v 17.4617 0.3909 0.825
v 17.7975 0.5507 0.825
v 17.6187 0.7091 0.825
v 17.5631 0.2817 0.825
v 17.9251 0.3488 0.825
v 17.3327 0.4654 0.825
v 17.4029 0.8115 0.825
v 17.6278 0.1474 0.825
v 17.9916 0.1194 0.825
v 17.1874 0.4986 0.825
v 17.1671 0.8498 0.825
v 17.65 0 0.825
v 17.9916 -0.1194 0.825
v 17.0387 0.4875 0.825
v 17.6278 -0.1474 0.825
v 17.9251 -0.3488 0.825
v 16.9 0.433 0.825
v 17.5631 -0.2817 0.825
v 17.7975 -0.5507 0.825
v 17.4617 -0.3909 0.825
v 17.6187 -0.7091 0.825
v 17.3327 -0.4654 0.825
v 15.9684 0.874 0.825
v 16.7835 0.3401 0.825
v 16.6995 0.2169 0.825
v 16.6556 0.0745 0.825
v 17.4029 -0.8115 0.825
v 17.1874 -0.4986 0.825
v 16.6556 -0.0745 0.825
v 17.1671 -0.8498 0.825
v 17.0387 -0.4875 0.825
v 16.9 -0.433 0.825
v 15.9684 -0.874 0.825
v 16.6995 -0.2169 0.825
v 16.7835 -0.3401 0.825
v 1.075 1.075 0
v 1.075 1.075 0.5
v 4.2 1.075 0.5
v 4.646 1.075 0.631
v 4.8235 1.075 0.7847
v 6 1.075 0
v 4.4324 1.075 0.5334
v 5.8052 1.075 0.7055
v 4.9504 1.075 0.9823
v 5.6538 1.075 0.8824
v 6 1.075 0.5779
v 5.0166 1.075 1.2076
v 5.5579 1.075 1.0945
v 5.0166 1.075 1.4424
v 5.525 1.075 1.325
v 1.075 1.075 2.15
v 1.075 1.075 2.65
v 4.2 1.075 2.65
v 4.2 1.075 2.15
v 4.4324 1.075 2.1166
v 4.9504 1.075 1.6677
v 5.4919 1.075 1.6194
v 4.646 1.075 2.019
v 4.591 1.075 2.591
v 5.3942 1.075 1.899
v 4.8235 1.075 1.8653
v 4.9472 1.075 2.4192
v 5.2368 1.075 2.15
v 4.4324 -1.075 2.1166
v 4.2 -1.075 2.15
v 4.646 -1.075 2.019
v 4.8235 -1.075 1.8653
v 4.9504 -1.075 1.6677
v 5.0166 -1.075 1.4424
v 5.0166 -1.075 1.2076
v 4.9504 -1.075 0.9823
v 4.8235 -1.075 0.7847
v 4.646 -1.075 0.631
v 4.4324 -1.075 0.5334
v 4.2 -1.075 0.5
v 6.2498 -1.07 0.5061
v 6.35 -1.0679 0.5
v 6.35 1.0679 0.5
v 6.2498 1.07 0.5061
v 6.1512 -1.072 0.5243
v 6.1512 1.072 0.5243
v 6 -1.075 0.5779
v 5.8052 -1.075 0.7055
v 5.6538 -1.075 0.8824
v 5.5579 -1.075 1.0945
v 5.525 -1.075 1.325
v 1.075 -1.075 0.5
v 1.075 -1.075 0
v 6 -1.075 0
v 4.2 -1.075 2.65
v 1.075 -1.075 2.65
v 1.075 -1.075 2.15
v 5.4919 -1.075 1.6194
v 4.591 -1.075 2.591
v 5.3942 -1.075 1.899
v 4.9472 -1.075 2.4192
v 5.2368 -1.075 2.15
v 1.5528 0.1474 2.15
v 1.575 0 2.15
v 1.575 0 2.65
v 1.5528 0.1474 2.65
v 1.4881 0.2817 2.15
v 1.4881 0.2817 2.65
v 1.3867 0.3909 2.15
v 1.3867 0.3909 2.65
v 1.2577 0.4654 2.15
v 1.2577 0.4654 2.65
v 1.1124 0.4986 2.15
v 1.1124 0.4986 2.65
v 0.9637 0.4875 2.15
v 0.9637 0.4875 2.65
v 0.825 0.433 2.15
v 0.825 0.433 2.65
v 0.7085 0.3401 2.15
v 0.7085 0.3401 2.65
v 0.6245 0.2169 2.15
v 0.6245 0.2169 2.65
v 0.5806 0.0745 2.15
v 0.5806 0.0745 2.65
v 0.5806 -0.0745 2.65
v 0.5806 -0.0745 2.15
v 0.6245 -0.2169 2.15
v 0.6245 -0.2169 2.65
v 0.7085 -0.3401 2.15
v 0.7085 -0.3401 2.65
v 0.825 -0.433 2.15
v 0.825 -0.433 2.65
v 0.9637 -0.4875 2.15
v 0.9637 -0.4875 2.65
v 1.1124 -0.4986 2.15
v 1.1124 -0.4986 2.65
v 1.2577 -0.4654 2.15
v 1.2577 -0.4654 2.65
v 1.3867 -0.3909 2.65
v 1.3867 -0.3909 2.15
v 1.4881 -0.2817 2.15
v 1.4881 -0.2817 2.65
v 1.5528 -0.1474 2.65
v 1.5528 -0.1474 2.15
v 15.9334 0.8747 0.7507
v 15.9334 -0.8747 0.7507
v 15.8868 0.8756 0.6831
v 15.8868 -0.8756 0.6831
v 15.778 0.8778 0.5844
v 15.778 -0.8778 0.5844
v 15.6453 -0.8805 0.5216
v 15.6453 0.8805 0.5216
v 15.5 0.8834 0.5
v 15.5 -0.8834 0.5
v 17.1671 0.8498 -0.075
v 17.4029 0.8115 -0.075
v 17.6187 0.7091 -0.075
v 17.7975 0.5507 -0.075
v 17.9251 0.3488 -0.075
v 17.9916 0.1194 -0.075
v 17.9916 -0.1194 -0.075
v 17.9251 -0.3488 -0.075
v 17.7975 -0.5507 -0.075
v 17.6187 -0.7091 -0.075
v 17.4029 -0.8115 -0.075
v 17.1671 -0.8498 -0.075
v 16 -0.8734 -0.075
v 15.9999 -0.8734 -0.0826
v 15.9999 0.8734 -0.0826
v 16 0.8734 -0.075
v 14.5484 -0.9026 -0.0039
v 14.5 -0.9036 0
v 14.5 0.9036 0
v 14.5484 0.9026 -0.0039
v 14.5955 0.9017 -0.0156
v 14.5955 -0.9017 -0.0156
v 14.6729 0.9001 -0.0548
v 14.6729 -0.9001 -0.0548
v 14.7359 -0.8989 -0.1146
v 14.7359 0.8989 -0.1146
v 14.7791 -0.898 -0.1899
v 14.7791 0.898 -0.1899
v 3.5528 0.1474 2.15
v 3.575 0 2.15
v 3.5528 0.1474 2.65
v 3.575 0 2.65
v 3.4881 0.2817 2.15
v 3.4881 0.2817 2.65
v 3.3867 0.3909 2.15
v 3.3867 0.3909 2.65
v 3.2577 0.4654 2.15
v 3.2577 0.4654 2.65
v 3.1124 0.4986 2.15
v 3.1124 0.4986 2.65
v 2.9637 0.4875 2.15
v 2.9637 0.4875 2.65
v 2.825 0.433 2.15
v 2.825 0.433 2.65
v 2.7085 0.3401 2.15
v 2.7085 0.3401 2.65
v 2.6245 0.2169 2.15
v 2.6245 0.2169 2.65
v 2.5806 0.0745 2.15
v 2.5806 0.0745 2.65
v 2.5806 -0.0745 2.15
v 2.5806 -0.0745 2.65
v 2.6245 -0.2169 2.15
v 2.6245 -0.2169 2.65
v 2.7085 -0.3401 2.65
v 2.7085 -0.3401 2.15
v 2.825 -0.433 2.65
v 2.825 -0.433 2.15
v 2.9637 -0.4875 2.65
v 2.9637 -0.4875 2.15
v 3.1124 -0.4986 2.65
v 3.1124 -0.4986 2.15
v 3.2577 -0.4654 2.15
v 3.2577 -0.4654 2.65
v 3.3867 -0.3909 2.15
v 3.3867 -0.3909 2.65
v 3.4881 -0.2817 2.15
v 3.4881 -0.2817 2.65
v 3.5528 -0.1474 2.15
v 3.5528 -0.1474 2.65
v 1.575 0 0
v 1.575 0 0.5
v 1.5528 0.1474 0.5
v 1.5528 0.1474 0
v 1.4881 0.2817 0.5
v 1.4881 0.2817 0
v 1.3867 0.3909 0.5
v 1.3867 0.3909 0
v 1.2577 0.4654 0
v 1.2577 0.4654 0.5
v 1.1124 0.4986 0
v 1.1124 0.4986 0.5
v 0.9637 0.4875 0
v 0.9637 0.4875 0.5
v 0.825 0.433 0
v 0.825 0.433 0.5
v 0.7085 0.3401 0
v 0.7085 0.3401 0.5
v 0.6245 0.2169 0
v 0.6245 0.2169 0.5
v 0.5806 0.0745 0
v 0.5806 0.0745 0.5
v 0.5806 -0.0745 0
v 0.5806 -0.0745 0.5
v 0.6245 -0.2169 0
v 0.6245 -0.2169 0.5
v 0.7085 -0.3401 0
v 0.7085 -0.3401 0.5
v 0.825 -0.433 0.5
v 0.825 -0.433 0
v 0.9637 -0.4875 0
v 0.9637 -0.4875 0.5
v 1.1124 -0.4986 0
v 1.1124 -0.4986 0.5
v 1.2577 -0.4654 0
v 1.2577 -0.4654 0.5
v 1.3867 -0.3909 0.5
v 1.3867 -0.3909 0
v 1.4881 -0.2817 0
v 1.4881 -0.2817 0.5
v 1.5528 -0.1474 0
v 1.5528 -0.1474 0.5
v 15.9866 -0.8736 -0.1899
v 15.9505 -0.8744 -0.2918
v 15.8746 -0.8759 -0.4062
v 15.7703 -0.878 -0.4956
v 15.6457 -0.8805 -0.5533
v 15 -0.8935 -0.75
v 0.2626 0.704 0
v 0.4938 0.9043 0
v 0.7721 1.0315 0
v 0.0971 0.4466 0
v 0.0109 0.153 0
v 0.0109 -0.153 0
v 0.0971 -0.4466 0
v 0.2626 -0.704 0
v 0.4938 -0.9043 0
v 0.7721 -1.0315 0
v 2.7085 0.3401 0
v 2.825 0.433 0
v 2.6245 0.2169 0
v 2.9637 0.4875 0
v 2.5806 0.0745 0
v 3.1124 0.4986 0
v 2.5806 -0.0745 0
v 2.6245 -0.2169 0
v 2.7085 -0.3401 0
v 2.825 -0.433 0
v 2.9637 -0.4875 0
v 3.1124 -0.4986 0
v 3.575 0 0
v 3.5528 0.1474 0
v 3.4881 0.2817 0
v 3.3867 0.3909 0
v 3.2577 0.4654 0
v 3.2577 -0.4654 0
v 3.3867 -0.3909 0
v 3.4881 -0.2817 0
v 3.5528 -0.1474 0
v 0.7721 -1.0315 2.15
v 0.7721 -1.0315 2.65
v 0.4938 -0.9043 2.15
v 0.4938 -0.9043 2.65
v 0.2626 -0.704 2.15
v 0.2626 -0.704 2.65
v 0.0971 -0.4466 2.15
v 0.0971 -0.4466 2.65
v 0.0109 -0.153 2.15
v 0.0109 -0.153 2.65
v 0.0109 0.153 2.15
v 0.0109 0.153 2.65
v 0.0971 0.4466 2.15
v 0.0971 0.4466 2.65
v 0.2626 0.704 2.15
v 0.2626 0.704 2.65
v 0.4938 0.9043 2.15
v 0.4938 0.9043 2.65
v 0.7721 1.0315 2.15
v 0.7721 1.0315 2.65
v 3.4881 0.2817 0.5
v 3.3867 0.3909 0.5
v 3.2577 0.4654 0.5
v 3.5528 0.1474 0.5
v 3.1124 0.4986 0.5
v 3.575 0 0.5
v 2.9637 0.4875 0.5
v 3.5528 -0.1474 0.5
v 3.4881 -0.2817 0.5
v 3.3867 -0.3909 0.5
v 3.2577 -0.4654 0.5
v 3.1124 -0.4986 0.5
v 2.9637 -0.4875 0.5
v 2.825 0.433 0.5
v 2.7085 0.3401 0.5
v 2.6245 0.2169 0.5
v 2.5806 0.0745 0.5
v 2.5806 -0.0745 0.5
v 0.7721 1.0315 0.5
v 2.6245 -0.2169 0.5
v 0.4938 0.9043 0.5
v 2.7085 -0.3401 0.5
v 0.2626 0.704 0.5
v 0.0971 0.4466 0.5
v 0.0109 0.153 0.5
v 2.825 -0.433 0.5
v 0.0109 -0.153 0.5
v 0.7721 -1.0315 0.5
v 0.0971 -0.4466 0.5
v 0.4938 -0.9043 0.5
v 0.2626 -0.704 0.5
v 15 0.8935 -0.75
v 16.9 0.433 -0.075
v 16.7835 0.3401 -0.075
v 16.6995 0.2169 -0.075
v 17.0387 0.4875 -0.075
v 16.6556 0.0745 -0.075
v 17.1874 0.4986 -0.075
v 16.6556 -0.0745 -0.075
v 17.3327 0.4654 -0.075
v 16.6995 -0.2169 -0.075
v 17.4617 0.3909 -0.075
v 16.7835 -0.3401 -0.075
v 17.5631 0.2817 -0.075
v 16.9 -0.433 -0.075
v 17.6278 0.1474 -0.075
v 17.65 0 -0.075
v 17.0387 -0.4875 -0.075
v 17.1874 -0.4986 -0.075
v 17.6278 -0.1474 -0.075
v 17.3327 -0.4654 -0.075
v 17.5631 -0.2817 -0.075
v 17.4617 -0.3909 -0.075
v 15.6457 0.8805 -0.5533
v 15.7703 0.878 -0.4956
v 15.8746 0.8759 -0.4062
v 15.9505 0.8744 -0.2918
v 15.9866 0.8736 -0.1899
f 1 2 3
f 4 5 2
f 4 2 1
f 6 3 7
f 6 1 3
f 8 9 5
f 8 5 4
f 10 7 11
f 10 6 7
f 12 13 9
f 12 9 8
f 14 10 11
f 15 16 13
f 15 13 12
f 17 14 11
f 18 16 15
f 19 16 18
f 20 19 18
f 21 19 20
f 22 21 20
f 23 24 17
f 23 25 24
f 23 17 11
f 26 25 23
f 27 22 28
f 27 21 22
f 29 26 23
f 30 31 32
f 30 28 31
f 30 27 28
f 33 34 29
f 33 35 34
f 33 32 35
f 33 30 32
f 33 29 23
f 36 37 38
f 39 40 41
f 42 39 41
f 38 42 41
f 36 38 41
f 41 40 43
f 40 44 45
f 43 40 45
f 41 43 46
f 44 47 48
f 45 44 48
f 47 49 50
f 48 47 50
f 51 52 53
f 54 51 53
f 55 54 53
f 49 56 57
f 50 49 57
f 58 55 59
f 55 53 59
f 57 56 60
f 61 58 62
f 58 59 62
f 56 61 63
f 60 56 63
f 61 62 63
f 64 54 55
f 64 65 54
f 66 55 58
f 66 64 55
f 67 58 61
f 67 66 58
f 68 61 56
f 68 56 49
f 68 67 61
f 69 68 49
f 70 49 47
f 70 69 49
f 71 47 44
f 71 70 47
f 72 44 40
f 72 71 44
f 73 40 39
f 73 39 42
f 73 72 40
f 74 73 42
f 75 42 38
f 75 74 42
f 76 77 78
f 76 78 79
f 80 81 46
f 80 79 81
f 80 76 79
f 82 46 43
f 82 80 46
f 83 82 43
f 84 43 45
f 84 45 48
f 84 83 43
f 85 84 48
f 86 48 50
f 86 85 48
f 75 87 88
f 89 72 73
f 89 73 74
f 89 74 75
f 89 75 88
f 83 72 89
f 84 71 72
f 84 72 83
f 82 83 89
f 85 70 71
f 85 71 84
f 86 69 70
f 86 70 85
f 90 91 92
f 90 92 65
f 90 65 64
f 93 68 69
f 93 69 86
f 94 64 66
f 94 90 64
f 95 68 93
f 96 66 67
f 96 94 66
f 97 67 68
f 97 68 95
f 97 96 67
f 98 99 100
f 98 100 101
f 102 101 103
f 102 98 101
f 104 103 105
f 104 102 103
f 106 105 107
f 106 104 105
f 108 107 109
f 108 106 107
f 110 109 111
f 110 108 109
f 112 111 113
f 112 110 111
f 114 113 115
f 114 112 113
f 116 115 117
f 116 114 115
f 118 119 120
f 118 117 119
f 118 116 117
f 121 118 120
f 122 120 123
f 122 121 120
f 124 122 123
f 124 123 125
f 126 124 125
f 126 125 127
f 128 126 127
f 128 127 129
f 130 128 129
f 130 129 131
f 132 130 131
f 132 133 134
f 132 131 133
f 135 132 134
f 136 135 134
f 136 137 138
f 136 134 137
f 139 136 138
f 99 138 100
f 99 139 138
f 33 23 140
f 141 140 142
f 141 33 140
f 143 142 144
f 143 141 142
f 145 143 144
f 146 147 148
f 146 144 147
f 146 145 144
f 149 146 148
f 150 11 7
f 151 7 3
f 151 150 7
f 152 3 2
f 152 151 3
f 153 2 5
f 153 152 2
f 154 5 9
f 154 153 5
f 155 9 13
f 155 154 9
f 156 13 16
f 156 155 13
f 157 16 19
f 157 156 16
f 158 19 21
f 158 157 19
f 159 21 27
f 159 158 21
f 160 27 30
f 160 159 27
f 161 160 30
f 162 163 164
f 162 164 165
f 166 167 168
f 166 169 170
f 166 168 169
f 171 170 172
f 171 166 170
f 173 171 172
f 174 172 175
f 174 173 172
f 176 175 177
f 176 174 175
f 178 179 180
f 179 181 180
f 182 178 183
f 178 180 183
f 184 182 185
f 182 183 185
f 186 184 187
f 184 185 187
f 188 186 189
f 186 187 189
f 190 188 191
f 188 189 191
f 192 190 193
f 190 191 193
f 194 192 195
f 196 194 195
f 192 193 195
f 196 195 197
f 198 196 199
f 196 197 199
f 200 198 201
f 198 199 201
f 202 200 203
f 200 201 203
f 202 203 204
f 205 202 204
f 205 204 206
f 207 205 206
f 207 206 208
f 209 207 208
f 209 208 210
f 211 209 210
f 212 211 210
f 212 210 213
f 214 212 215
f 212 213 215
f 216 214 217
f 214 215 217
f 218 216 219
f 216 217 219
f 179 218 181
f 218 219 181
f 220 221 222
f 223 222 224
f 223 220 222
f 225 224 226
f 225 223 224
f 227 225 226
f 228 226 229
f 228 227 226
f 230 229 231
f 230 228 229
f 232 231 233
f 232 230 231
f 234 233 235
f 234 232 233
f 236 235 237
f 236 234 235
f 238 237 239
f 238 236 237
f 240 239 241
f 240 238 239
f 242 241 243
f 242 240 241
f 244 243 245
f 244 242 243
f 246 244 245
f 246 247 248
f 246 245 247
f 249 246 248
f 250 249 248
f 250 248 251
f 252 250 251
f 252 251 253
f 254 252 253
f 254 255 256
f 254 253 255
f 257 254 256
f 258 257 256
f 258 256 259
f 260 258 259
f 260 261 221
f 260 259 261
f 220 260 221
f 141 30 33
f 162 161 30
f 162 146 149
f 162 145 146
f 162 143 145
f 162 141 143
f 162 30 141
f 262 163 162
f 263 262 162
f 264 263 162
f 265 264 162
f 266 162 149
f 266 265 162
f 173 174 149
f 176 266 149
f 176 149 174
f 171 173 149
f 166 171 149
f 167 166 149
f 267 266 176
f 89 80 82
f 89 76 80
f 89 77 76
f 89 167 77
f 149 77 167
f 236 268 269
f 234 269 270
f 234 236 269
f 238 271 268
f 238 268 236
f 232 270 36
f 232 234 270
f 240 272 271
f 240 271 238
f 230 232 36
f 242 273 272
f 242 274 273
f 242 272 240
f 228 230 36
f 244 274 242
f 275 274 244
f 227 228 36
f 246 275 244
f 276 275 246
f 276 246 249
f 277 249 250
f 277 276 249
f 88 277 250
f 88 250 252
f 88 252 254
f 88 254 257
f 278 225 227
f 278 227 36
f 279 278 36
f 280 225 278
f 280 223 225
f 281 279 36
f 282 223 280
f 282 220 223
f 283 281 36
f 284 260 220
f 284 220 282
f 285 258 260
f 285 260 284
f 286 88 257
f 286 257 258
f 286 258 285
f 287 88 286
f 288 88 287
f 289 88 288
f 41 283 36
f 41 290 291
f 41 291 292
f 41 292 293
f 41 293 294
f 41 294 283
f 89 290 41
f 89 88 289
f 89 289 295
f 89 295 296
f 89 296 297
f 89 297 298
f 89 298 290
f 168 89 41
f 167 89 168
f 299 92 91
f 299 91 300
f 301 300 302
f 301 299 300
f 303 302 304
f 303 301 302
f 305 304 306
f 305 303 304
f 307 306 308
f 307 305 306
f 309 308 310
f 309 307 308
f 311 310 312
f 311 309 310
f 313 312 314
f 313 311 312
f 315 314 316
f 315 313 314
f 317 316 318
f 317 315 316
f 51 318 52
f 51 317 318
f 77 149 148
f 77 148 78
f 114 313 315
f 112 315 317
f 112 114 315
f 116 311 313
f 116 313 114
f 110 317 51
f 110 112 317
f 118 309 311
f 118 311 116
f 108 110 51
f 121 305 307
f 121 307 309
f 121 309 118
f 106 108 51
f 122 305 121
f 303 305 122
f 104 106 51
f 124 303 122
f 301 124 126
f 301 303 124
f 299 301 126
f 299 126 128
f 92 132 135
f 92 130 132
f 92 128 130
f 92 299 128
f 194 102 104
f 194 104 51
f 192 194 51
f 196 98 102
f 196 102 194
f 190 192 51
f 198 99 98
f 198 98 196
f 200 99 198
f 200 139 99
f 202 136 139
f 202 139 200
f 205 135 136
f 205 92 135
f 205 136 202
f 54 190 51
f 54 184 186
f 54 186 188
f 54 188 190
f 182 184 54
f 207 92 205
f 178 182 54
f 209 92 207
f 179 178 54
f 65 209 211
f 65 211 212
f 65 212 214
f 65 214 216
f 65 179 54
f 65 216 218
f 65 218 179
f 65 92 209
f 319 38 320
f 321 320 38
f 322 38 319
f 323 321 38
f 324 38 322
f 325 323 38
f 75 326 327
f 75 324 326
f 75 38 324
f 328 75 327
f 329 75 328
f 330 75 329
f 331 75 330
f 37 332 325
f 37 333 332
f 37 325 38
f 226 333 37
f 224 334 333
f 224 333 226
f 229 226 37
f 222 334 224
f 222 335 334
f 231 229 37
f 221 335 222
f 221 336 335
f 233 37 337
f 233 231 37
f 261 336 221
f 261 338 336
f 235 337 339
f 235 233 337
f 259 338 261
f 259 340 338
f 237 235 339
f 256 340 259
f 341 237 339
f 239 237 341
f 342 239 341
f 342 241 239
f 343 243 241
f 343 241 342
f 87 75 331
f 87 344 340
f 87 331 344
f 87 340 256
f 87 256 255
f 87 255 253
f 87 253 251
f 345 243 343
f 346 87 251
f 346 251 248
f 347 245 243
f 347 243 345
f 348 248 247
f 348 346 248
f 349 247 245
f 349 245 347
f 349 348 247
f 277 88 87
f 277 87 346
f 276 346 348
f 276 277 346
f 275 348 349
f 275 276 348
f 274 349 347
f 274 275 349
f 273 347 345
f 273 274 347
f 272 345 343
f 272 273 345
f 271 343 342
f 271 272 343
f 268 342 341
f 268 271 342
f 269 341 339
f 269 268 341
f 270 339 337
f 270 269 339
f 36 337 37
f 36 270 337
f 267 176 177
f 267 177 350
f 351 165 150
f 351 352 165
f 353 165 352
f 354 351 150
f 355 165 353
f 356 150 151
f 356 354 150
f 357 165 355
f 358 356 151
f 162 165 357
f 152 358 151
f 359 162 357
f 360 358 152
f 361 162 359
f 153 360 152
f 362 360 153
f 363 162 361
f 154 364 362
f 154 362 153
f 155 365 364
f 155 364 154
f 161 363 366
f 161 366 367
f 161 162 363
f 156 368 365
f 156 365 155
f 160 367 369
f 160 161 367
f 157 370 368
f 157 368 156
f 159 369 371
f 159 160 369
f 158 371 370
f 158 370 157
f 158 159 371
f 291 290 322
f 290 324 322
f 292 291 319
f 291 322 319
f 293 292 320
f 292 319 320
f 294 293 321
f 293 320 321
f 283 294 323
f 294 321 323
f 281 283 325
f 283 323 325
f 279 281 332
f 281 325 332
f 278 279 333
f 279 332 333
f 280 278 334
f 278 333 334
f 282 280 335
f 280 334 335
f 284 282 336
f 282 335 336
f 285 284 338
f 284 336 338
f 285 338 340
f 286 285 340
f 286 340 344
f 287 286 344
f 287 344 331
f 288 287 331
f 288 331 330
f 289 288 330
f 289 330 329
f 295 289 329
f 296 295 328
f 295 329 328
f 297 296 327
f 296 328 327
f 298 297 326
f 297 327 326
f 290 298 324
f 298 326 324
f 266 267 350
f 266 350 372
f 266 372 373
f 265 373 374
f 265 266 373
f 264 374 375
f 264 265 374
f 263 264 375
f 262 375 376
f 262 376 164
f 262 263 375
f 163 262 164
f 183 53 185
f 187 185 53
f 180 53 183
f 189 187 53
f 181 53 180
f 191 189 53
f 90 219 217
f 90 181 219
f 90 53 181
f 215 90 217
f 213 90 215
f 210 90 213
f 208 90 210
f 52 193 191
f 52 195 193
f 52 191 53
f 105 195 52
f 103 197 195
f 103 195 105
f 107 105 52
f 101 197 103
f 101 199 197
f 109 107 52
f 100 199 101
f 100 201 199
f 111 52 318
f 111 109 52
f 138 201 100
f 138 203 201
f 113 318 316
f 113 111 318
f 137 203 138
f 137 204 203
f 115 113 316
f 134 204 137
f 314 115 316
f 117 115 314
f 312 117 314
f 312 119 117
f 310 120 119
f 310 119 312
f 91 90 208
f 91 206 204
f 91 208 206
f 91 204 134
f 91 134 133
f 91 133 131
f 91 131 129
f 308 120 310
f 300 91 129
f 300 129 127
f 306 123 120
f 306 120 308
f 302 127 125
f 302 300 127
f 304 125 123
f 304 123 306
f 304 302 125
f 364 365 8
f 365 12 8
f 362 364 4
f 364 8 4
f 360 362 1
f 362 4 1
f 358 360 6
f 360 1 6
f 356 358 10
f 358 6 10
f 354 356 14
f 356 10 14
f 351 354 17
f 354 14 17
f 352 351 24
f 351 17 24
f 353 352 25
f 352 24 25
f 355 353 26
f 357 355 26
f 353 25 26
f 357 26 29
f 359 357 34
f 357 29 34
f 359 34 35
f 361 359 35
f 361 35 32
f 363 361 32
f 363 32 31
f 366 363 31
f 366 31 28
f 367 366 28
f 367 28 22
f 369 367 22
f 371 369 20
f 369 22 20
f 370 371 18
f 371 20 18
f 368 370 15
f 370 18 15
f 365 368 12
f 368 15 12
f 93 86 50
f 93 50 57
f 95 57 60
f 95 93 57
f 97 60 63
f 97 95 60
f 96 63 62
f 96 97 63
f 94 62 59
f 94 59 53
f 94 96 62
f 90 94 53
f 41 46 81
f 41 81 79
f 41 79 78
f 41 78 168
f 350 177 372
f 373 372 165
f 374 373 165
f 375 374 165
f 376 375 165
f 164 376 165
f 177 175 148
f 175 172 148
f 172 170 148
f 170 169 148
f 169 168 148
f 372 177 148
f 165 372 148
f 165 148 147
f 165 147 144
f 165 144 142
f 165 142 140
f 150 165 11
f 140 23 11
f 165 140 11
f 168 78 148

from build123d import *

# Parameters (mm, degrees)
F1_DEPTH = 1.075
F2_W     = 20.9250352345
F2_H     = 5.8195129968
F2_R     = 0.5
F3_DEPTH = 12.5
F4_R     = 0.5
F5_DEPTH = 12.5


# Not quite as in the source:
# - ends of sketch curves that miss each other by under 0.0002 mm in the source are joined


with BuildPart() as f1:
    # F0 (on Front) → F1 (new body, symmetric)
    with BuildSketch(Plane.XZ):
        with BuildLine():
            Line((0, 0.5), (0, 0))
            Line((0, 0), (14.5, 0))
            ThreePointArc((14.5, 0), (14.6687831398, -0.051983364), (14.7790735103, -0.1899183219))
            Line((14.7790735103, -0.1899183219), (15, -0.75))
            Line((15, -0.75), (15.645704163, -0.55329938))
            ThreePointArc((15.645704163, -0.55329938), (15.8994973246, -0.3756690667), (15.9999418448, -0.082625733))
            Line((15.9999418448, -0.082625733), (16, -0.075))
            Line((16, -0.075), (18, -0.075))
            Line((18, -0.075), (18, 0.825))
            Line((18, 0.825), (15.9683748499, 0.825))
            ThreePointArc((15.9683748499, 0.825), (15.7850438563, 0.5892080819), (15.5, 0.5))
            Line((15.5, 0.5), (6.35, 0.5))
            ThreePointArc((6.35, 0.5), (5.7666369055, 0.7416369055), (5.525, 1.325))
            ThreePointArc((5.525, 1.325), (5.4508825364, 1.7619415066), (5.2368220677, 2.15))
            Line((5.2368220677, 2.15), (4.2, 2.15))
            ThreePointArc((4.2, 2.15), (5.025, 1.325), (4.2, 0.5))
            Line((4.2, 0.5), (0, 0.5))
        make_face()
        with BuildLine():
            Line((0, 2.15), (4.2, 2.15))
            Line((4.2, 2.15), (5.2368220677, 2.15))
            ThreePointArc((5.2368220677, 2.15), (4.7755432217, 2.5184718262), (4.2, 2.65))
            Line((4.2, 2.65), (0, 2.65))
            Line((0, 2.65), (0, 2.15))
        make_face()
    extrude(amount=F1_DEPTH, both=True)

    # F2 (on Top) → F3 (cut, symmetric)
    with BuildSketch(Plane.XY):
        with Locations((8.4883153904, -0.0547866803)):
            Rectangle(F2_W, F2_H)
        with BuildLine():
            Line((6, 1.075), (17.1671358116, 0.8498272554))
            ThreePointArc((17.1671358116, 0.8498272554), (17.7570689581, 0.5949514939), (18, 0))
            ThreePointArc((18, 0), (17.7570689581, -0.5949514939), (17.1671358116, -0.8498272554))
            Line((17.1671358116, -0.8498272554), (6, -1.075))
            Line((6, -1.075), (1.075, -1.075))
            ThreePointArc((1.075, -1.075), (0.3148602102, -0.7601397898), (0, 0))
            ThreePointArc((0, 0), (0.3148602102, 0.7601397898), (1.075, 1.075))
            Line((1.075, 1.075), (6, 1.075))
        make_face(mode=Mode.SUBTRACT)
        with Locations((1.075, 0)):
            Circle(F2_R)
        with Locations((3.075, 0)):
            Circle(F2_R)
    extrude(amount=F3_DEPTH, both=True, mode=Mode.SUBTRACT)

    # F4 (on Top) → F5 (cut, symmetric)
    with BuildSketch(Plane.XY):
        with Locations((17.15, 0)):
            Circle(F4_R)
    extrude(amount=F5_DEPTH, both=True, mode=Mode.SUBTRACT)


solid = f1.part
